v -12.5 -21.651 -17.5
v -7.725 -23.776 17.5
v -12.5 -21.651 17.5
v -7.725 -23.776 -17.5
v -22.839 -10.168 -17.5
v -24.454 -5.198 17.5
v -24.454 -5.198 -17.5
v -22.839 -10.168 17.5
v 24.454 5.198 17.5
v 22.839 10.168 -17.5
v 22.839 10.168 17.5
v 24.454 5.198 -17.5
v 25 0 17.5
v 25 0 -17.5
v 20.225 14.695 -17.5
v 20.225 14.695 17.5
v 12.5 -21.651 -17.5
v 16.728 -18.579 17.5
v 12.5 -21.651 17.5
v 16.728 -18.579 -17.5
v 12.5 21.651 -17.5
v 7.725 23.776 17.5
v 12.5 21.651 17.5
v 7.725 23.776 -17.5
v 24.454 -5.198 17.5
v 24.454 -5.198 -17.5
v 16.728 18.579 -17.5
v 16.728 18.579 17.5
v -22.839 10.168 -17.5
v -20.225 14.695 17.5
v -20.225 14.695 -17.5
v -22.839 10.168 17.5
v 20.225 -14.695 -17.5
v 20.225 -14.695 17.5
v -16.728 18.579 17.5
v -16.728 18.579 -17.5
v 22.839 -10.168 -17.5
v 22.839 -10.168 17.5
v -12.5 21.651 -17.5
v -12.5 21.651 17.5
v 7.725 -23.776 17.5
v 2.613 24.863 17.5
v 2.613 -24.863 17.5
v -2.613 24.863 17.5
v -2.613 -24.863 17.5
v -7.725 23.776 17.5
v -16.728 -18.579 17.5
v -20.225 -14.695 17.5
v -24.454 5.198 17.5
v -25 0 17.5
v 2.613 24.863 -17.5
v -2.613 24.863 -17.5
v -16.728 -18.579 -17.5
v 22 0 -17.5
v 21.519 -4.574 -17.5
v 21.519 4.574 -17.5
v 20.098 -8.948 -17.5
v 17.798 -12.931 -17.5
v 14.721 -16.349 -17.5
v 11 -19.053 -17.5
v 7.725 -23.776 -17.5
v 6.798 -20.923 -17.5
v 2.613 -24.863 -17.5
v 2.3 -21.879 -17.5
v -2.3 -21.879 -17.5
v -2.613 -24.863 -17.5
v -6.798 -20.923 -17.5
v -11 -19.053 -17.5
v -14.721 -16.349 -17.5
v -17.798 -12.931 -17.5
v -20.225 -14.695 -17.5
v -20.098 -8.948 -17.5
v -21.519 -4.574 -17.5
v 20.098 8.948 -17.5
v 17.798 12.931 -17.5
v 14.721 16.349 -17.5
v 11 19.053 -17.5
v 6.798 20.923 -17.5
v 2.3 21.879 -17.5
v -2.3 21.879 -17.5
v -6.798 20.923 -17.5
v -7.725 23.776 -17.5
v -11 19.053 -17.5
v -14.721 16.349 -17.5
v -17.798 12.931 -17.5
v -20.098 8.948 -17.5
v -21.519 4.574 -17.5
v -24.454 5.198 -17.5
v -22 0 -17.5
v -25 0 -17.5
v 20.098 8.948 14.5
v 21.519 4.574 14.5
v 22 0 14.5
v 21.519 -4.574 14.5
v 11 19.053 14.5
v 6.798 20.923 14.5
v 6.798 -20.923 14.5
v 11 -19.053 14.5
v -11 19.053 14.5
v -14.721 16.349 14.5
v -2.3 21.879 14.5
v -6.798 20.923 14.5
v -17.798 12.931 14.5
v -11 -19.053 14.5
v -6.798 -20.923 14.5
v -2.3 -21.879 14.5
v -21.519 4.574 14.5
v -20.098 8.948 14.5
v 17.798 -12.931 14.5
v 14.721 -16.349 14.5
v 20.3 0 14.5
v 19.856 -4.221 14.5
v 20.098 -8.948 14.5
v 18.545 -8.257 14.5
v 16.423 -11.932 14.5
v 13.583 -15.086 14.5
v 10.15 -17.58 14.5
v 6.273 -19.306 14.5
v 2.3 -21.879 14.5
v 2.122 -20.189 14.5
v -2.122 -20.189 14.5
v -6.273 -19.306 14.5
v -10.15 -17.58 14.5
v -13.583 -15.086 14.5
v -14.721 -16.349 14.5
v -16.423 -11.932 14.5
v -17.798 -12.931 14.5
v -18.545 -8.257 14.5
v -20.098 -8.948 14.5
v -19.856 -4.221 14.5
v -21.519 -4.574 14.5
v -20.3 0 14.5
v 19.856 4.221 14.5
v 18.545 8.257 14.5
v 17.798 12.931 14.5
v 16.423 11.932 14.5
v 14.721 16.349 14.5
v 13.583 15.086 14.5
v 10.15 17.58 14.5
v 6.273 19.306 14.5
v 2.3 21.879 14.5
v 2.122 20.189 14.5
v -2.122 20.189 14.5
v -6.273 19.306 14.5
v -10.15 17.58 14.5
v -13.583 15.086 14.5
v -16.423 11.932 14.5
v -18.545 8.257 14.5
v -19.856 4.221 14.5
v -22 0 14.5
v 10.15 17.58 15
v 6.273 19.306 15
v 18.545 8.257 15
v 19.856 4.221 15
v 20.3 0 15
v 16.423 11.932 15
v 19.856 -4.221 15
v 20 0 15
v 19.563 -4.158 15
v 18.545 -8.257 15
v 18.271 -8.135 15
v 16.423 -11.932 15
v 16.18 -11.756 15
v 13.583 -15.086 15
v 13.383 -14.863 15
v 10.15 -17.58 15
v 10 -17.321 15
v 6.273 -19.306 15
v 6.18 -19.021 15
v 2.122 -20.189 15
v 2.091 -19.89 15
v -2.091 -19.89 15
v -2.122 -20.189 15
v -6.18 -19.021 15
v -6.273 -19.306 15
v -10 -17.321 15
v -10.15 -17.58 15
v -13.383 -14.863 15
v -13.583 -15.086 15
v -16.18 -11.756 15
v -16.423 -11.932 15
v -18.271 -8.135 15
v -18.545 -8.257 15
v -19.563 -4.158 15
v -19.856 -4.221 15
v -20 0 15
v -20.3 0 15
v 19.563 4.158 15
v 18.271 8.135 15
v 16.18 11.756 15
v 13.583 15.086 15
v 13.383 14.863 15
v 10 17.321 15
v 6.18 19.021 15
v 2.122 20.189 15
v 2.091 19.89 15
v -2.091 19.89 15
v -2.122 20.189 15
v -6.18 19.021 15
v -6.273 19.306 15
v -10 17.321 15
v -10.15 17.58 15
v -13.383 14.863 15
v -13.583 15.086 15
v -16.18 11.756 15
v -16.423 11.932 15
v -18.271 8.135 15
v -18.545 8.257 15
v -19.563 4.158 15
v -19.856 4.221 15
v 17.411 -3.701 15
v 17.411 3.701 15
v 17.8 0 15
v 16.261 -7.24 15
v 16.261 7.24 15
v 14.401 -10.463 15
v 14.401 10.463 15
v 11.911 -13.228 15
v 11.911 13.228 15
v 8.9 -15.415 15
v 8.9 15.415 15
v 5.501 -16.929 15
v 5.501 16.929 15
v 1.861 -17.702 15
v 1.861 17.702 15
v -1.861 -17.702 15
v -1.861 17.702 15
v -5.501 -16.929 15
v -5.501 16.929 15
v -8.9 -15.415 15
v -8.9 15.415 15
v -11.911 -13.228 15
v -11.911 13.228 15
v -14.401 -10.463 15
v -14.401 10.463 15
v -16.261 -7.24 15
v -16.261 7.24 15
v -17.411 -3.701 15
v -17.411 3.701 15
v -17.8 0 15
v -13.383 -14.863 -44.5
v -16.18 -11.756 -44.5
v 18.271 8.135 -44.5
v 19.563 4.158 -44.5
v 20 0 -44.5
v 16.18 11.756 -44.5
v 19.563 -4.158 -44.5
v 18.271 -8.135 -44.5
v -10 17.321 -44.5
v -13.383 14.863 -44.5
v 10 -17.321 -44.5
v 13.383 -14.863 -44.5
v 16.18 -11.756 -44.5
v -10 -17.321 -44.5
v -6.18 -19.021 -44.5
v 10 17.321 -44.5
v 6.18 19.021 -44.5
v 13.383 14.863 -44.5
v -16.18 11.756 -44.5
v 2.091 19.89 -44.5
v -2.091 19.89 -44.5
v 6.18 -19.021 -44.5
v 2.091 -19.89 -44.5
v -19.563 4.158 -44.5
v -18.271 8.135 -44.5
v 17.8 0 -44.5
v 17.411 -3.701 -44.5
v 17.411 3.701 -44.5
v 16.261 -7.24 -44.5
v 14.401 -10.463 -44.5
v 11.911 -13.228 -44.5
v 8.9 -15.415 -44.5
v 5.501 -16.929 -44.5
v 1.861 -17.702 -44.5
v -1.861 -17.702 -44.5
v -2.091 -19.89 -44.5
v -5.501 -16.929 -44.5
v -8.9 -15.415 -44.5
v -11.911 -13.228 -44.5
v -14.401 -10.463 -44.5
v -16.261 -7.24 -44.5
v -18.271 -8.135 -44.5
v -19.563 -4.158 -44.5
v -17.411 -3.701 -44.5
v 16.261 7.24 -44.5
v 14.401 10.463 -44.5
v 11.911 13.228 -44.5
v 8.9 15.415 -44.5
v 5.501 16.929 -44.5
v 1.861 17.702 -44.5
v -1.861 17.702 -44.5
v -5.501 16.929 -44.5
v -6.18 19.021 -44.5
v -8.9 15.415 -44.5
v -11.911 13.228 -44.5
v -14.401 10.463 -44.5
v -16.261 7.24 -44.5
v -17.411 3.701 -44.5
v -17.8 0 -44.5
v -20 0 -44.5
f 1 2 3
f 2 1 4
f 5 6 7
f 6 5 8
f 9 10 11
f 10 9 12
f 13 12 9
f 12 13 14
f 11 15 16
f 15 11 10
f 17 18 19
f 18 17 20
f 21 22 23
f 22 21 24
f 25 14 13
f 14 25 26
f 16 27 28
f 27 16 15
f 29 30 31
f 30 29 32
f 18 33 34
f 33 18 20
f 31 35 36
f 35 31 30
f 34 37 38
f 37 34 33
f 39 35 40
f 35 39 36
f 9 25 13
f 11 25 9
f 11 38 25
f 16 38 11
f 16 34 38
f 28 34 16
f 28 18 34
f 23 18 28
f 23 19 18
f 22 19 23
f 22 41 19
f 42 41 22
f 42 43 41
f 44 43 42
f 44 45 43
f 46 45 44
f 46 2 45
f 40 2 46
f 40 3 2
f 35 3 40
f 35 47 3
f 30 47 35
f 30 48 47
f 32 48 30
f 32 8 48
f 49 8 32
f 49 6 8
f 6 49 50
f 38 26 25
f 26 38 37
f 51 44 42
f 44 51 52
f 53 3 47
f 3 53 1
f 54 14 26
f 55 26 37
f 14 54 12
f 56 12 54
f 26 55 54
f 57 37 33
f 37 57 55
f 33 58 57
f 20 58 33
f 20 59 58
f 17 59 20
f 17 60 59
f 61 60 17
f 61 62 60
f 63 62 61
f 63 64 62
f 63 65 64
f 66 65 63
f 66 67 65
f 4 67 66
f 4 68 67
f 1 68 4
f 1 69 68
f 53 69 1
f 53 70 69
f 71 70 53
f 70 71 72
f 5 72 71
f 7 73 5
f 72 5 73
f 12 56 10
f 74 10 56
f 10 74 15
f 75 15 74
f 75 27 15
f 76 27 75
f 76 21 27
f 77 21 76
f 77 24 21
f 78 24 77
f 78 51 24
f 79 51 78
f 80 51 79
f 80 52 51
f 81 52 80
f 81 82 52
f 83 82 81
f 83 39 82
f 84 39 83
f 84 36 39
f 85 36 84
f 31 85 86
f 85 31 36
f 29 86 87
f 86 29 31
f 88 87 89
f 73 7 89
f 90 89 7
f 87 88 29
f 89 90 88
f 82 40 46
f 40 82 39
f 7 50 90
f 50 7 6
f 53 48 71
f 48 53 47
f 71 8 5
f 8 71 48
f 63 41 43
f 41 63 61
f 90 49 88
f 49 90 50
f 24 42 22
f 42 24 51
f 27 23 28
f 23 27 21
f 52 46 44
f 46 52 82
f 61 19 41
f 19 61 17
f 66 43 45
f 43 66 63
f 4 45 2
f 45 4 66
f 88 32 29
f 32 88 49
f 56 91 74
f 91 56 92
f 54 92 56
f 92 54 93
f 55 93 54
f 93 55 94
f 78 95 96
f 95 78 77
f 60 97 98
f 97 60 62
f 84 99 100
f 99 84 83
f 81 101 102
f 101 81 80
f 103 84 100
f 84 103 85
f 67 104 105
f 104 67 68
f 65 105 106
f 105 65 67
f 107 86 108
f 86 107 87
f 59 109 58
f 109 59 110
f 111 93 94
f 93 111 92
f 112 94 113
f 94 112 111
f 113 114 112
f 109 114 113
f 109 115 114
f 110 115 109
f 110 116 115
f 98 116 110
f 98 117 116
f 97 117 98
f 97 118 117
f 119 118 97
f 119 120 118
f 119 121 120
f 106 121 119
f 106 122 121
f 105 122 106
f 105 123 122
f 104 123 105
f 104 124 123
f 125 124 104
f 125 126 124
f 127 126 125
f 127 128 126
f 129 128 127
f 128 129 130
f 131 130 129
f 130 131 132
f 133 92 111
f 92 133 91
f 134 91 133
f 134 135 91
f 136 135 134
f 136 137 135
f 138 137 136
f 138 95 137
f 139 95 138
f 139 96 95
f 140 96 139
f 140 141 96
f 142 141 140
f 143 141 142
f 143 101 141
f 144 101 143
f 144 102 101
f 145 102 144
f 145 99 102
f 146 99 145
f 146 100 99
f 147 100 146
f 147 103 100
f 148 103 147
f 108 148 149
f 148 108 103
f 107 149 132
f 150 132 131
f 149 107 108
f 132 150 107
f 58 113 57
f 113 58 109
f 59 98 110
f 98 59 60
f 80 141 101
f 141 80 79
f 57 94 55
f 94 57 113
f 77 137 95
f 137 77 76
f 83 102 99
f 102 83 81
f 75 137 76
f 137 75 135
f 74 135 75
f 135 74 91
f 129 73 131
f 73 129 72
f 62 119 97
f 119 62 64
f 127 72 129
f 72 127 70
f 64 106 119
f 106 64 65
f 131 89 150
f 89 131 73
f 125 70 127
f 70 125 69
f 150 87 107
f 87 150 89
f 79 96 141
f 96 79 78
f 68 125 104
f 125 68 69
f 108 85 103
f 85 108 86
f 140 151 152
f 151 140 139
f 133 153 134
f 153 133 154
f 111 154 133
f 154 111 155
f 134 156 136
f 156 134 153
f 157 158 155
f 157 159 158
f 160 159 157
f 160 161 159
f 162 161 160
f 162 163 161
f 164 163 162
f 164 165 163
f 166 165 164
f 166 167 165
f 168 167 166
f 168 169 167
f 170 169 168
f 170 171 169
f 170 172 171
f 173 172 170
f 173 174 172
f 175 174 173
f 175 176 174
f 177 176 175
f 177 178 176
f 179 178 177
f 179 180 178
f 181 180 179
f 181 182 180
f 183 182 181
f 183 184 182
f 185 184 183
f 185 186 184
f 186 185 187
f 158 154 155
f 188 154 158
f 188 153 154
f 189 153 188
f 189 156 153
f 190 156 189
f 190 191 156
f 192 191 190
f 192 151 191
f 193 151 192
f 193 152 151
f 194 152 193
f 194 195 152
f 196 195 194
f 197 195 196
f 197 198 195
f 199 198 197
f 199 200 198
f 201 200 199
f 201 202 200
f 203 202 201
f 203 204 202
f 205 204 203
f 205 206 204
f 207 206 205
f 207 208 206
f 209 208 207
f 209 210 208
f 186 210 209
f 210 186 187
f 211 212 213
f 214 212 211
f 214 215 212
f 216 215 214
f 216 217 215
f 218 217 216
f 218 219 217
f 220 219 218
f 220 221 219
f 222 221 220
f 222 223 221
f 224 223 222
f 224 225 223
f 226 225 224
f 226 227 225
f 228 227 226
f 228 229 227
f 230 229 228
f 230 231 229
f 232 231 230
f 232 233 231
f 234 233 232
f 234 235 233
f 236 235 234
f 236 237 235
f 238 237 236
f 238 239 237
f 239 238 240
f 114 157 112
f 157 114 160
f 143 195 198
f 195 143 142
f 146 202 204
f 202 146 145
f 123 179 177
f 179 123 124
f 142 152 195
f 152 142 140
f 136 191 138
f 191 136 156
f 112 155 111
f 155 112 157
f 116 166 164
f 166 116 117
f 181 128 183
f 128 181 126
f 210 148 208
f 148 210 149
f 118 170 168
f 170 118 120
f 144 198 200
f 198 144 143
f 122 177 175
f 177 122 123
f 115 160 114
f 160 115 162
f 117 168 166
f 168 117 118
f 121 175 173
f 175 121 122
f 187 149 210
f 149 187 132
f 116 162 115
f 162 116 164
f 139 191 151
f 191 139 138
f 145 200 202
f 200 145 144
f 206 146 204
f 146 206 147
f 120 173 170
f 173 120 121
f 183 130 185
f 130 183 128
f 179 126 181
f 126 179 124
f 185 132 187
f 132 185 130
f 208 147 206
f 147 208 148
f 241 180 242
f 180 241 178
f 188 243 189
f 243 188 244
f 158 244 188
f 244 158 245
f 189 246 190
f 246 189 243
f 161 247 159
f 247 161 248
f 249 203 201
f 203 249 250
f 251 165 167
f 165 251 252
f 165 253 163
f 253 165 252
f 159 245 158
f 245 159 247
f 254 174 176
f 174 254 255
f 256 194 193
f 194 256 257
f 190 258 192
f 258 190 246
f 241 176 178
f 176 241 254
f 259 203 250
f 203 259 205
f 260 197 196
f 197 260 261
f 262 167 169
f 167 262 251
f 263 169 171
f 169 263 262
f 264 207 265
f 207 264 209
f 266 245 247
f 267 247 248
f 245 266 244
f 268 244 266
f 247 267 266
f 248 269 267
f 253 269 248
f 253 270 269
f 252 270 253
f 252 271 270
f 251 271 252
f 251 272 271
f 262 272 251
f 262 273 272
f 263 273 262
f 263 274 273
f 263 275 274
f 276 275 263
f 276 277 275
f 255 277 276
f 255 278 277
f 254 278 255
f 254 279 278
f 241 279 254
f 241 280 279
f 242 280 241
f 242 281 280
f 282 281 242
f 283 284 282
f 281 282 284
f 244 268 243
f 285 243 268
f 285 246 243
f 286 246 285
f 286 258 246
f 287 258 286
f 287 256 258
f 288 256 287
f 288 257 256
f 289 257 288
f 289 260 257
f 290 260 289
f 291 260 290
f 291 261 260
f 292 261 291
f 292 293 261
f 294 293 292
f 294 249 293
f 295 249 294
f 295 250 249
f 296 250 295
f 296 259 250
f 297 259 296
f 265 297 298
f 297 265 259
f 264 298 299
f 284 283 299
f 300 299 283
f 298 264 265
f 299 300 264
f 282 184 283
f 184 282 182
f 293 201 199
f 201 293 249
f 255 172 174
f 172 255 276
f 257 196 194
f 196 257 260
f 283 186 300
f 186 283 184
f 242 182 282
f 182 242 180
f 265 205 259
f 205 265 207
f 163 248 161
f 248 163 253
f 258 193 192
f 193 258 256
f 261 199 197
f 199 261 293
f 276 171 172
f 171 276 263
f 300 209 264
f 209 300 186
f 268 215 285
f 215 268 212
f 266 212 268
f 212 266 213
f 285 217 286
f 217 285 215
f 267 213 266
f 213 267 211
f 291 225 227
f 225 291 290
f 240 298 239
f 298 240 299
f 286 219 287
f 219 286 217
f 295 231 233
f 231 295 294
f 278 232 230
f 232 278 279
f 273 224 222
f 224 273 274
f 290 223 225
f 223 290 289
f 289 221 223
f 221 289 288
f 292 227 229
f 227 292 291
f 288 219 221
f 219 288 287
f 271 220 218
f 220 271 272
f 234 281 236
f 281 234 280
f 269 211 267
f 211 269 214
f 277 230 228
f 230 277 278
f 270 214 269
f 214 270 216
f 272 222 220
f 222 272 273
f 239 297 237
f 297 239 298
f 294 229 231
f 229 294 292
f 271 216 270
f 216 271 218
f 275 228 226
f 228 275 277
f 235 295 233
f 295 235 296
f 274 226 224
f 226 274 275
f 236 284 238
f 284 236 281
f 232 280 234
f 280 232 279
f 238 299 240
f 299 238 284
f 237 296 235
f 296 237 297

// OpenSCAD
// Parameters
nominal_diameter_mm = 40; //[20:80:1]
pipe_od_mm = 40; //[20:80:0.1]
cap_outer_diameter_mm = 50; //[25:100:0.1]
cap_total_height_mm = 35; //[18:70:0.1]
socket_depth_mm = 25; //[10:60:0.1]
cap_wall_thickness_mm = 3; //[1.5:6:0.1]
end_face_thickness_mm = 3; //[1.5:8:0.1]
clearance_mm = 0.3; //[0.1:1:0.05]
overlap_mm = 1; //[0.5:2:0.1]
pipe_wall_mm = 2.2; //[1.1:4.4:0.1]
pipe_length_mm = 60; //[30:120:1]

// PVC HT Pipe End Cap
module cap_body() {
  difference() {
    // Outer cap body
    cylinder(r=cap_outer_diameter_mm/2, h=cap_total_height_mm, center=true);
    // Inner stop shoulder void
    translate([0, 0, -end_face_thickness_mm/2 - overlap_mm/2])
      cylinder(r=cap_outer_diameter_mm/2 - cap_wall_thickness_mm, h=cap_total_height_mm - end_face_thickness_mm + overlap_mm, center=true);
    // Internal socket void
    translate([0, 0, cap_total_height_mm/2 - end_face_thickness_mm - socket_depth_mm/2])
      cylinder(r=pipe_od_mm/2 + clearance_mm, h=socket_depth_mm + overlap_mm, center=true);
  }
}

// HT Pipe
module ht_pipe() {
  difference() {
    // Outer pipe
    translate([0, 0, cap_total_height_mm/2 - end_face_thickness_mm - pipe_length_mm/2 + overlap_mm])
      cylinder(r=pipe_od_mm/2, h=pipe_length_mm, center=true);
    // Inner pipe void
    translate([0, 0, cap_total_height_mm/2 - end_face_thickness_mm - pipe_length_mm/2 + overlap_mm])
      cylinder(r=pipe_od_mm/2 - pipe_wall_mm, h=pipe_length_mm + overlap_mm, center=true);
  }
}

// Assembly
module assembly() {
  color([0.85, 0.85, 0.8]) cap_body();
  color([0.2, 0.2, 0.2]) ht_pipe();
}

assembly();
